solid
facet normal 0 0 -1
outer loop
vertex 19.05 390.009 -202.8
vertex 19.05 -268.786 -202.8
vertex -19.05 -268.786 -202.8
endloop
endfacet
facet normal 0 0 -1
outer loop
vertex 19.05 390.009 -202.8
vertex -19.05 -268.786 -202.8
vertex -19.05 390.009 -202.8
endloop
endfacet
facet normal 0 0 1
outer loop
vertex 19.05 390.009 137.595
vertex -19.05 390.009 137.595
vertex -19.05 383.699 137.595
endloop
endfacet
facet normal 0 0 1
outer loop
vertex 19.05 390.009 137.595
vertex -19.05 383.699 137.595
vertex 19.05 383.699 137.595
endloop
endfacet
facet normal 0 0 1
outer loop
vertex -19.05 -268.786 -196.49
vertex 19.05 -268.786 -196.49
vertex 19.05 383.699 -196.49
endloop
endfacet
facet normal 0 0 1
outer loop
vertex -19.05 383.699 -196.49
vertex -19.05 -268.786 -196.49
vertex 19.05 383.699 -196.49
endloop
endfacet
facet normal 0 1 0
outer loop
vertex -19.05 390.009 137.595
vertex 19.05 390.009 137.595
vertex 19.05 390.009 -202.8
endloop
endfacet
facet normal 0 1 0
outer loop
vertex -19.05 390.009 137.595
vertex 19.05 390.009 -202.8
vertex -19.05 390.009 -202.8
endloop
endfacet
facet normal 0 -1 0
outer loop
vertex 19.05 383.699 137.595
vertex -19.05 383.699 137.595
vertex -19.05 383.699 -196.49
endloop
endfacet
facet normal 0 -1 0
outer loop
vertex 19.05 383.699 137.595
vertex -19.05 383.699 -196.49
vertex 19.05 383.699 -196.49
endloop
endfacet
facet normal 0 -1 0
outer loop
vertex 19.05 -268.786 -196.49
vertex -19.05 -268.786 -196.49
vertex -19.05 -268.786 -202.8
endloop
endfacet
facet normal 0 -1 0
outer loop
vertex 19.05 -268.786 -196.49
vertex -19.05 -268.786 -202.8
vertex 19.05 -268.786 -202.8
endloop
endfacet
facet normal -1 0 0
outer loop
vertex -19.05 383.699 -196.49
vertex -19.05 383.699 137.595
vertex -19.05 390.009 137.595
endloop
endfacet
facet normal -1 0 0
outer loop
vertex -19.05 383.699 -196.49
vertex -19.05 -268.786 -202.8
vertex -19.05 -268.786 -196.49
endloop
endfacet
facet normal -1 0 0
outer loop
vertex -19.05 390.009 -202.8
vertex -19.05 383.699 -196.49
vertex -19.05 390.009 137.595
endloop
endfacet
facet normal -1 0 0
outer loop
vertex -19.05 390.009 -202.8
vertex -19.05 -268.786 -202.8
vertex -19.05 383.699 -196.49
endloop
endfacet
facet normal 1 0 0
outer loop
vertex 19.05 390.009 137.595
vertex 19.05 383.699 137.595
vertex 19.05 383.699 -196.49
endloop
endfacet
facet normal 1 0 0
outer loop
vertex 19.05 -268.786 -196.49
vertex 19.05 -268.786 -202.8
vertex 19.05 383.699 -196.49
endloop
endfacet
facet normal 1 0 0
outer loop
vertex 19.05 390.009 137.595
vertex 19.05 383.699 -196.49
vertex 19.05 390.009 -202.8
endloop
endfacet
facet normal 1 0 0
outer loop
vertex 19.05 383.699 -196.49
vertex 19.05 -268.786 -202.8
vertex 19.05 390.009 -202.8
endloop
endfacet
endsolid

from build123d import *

# Parameters (mm, degrees)
CROQUIS1_W              = 38.1
CROQUIS1_H              = 850.5
SALIENTE_EXTRUIR1_DEPTH = 6.31
CROQUIS2_W              = 38.1
CROQUIS2_H              = 6.31
SALIENTE_EXTRUIR2_DEPTH = 70
CROQUIS3_W              = 38.1
CROQUIS3_H              = 6.31
SALIENTE_EXTRUIR3_DEPTH = 578
CROQUIS4_R              = 6.935856655
CORTAR_EXTRUIR1_DEPTH   = 7
CROQUIS5_W              = 38.1
CROQUIS5_H              = 687.72607772
CORTAR_EXTRUIR2_DEPTH   = 10
CROQUIS6_W              = 38.1
CROQUIS6_H              = 6.31
CROQUIS8_W              = 368.89
CROQUIS8_H              = 6.31
CORTAR_EXTRUIR3_DEPTH   = 147


with BuildPart() as part:
    # Croquis1 → Saliente-Extruir1 (new body)
    with BuildSketch(Plane.XY):
        Rectangle(CROQUIS1_W, CROQUIS1_H)
    extrude(amount=SALIENTE_EXTRUIR1_DEPTH)

    # Croquis2 → Saliente-Extruir2 (add)
    with BuildSketch(Plane.XY.offset(6.31)):
        with Locations((0, -422.095)):
            Rectangle(CROQUIS2_W, CROQUIS2_H)
    extrude(amount=SALIENTE_EXTRUIR2_DEPTH)

    # Croquis3 → Saliente-Extruir3 (add)
    with BuildSketch(Plane.XY.offset(6.31)):
        with Locations((0, -265.63107772)):
            Rectangle(CROQUIS3_W, CROQUIS3_H)
    extrude(amount=-SALIENTE_EXTRUIR3_DEPTH)

    # Croquis4 → Cortar-Extruir1 (cut)
    with BuildSketch(Plane(origin=(0, -262.47607772, 0), x_dir=(1, 0, 0), z_dir=(0, 1, 0))):
        with Locations(Location((0, 536.981534281, 0), (0, 0, 270))):
            Circle(CROQUIS4_R)
    extrude(amount=-CORTAR_EXTRUIR1_DEPTH, mode=Mode.SUBTRACT)

    # Croquis5 → Cortar-Extruir2 (cut)
    with BuildSketch(Plane(origin=(0, 0, 0), x_dir=(-1, 0, 0), z_dir=(0, 0, -1))):
        with Locations((0, 81.38696114)):
            Rectangle(CROQUIS5_W, CROQUIS5_H)
    extrude(amount=-CORTAR_EXTRUIR2_DEPTH, mode=Mode.SUBTRACT)

    # Barrer1: sweep along a curve in space
    with BuildLine() as barrer1_path:
        Line((0, -262.47607772, -199.645), (0, 386.85392228, -199.645))
        Line((0, 386.85392228, -199.645), (0, 386.85392228, 137.595))
    # Croquis6 → Barrer1 (sweep)
    with BuildSketch(Plane(origin=(0, -262.47607772, 0), x_dir=(1, 0, 0), z_dir=(0, 1, 0))):
        with Locations((0, 199.645)):
            Rectangle(CROQUIS6_W, CROQUIS6_H)
    sweep(path=barrer1_path.line, transition=Transition.RIGHT)

    # Croquis8 → Cortar-Extruir3 (cut)
    with BuildSketch(Plane(origin=(19.05, 0, 0), x_dir=(0, 0, -1), z_dir=(1, 0, 0))):
        Polygon((196.49, -262.47607772), (196.49, -268.78607772), (196.49, -444.307673596), (-90.834600665, -444.307673596), (-90.834600665, -262.47607772), align=None)
        with Locations((387.245, -265.63107772)):
            Rectangle(CROQUIS8_W, CROQUIS8_H)
    extrude(amount=-CORTAR_EXTRUIR3_DEPTH, mode=Mode.SUBTRACT)


solid = part.part
